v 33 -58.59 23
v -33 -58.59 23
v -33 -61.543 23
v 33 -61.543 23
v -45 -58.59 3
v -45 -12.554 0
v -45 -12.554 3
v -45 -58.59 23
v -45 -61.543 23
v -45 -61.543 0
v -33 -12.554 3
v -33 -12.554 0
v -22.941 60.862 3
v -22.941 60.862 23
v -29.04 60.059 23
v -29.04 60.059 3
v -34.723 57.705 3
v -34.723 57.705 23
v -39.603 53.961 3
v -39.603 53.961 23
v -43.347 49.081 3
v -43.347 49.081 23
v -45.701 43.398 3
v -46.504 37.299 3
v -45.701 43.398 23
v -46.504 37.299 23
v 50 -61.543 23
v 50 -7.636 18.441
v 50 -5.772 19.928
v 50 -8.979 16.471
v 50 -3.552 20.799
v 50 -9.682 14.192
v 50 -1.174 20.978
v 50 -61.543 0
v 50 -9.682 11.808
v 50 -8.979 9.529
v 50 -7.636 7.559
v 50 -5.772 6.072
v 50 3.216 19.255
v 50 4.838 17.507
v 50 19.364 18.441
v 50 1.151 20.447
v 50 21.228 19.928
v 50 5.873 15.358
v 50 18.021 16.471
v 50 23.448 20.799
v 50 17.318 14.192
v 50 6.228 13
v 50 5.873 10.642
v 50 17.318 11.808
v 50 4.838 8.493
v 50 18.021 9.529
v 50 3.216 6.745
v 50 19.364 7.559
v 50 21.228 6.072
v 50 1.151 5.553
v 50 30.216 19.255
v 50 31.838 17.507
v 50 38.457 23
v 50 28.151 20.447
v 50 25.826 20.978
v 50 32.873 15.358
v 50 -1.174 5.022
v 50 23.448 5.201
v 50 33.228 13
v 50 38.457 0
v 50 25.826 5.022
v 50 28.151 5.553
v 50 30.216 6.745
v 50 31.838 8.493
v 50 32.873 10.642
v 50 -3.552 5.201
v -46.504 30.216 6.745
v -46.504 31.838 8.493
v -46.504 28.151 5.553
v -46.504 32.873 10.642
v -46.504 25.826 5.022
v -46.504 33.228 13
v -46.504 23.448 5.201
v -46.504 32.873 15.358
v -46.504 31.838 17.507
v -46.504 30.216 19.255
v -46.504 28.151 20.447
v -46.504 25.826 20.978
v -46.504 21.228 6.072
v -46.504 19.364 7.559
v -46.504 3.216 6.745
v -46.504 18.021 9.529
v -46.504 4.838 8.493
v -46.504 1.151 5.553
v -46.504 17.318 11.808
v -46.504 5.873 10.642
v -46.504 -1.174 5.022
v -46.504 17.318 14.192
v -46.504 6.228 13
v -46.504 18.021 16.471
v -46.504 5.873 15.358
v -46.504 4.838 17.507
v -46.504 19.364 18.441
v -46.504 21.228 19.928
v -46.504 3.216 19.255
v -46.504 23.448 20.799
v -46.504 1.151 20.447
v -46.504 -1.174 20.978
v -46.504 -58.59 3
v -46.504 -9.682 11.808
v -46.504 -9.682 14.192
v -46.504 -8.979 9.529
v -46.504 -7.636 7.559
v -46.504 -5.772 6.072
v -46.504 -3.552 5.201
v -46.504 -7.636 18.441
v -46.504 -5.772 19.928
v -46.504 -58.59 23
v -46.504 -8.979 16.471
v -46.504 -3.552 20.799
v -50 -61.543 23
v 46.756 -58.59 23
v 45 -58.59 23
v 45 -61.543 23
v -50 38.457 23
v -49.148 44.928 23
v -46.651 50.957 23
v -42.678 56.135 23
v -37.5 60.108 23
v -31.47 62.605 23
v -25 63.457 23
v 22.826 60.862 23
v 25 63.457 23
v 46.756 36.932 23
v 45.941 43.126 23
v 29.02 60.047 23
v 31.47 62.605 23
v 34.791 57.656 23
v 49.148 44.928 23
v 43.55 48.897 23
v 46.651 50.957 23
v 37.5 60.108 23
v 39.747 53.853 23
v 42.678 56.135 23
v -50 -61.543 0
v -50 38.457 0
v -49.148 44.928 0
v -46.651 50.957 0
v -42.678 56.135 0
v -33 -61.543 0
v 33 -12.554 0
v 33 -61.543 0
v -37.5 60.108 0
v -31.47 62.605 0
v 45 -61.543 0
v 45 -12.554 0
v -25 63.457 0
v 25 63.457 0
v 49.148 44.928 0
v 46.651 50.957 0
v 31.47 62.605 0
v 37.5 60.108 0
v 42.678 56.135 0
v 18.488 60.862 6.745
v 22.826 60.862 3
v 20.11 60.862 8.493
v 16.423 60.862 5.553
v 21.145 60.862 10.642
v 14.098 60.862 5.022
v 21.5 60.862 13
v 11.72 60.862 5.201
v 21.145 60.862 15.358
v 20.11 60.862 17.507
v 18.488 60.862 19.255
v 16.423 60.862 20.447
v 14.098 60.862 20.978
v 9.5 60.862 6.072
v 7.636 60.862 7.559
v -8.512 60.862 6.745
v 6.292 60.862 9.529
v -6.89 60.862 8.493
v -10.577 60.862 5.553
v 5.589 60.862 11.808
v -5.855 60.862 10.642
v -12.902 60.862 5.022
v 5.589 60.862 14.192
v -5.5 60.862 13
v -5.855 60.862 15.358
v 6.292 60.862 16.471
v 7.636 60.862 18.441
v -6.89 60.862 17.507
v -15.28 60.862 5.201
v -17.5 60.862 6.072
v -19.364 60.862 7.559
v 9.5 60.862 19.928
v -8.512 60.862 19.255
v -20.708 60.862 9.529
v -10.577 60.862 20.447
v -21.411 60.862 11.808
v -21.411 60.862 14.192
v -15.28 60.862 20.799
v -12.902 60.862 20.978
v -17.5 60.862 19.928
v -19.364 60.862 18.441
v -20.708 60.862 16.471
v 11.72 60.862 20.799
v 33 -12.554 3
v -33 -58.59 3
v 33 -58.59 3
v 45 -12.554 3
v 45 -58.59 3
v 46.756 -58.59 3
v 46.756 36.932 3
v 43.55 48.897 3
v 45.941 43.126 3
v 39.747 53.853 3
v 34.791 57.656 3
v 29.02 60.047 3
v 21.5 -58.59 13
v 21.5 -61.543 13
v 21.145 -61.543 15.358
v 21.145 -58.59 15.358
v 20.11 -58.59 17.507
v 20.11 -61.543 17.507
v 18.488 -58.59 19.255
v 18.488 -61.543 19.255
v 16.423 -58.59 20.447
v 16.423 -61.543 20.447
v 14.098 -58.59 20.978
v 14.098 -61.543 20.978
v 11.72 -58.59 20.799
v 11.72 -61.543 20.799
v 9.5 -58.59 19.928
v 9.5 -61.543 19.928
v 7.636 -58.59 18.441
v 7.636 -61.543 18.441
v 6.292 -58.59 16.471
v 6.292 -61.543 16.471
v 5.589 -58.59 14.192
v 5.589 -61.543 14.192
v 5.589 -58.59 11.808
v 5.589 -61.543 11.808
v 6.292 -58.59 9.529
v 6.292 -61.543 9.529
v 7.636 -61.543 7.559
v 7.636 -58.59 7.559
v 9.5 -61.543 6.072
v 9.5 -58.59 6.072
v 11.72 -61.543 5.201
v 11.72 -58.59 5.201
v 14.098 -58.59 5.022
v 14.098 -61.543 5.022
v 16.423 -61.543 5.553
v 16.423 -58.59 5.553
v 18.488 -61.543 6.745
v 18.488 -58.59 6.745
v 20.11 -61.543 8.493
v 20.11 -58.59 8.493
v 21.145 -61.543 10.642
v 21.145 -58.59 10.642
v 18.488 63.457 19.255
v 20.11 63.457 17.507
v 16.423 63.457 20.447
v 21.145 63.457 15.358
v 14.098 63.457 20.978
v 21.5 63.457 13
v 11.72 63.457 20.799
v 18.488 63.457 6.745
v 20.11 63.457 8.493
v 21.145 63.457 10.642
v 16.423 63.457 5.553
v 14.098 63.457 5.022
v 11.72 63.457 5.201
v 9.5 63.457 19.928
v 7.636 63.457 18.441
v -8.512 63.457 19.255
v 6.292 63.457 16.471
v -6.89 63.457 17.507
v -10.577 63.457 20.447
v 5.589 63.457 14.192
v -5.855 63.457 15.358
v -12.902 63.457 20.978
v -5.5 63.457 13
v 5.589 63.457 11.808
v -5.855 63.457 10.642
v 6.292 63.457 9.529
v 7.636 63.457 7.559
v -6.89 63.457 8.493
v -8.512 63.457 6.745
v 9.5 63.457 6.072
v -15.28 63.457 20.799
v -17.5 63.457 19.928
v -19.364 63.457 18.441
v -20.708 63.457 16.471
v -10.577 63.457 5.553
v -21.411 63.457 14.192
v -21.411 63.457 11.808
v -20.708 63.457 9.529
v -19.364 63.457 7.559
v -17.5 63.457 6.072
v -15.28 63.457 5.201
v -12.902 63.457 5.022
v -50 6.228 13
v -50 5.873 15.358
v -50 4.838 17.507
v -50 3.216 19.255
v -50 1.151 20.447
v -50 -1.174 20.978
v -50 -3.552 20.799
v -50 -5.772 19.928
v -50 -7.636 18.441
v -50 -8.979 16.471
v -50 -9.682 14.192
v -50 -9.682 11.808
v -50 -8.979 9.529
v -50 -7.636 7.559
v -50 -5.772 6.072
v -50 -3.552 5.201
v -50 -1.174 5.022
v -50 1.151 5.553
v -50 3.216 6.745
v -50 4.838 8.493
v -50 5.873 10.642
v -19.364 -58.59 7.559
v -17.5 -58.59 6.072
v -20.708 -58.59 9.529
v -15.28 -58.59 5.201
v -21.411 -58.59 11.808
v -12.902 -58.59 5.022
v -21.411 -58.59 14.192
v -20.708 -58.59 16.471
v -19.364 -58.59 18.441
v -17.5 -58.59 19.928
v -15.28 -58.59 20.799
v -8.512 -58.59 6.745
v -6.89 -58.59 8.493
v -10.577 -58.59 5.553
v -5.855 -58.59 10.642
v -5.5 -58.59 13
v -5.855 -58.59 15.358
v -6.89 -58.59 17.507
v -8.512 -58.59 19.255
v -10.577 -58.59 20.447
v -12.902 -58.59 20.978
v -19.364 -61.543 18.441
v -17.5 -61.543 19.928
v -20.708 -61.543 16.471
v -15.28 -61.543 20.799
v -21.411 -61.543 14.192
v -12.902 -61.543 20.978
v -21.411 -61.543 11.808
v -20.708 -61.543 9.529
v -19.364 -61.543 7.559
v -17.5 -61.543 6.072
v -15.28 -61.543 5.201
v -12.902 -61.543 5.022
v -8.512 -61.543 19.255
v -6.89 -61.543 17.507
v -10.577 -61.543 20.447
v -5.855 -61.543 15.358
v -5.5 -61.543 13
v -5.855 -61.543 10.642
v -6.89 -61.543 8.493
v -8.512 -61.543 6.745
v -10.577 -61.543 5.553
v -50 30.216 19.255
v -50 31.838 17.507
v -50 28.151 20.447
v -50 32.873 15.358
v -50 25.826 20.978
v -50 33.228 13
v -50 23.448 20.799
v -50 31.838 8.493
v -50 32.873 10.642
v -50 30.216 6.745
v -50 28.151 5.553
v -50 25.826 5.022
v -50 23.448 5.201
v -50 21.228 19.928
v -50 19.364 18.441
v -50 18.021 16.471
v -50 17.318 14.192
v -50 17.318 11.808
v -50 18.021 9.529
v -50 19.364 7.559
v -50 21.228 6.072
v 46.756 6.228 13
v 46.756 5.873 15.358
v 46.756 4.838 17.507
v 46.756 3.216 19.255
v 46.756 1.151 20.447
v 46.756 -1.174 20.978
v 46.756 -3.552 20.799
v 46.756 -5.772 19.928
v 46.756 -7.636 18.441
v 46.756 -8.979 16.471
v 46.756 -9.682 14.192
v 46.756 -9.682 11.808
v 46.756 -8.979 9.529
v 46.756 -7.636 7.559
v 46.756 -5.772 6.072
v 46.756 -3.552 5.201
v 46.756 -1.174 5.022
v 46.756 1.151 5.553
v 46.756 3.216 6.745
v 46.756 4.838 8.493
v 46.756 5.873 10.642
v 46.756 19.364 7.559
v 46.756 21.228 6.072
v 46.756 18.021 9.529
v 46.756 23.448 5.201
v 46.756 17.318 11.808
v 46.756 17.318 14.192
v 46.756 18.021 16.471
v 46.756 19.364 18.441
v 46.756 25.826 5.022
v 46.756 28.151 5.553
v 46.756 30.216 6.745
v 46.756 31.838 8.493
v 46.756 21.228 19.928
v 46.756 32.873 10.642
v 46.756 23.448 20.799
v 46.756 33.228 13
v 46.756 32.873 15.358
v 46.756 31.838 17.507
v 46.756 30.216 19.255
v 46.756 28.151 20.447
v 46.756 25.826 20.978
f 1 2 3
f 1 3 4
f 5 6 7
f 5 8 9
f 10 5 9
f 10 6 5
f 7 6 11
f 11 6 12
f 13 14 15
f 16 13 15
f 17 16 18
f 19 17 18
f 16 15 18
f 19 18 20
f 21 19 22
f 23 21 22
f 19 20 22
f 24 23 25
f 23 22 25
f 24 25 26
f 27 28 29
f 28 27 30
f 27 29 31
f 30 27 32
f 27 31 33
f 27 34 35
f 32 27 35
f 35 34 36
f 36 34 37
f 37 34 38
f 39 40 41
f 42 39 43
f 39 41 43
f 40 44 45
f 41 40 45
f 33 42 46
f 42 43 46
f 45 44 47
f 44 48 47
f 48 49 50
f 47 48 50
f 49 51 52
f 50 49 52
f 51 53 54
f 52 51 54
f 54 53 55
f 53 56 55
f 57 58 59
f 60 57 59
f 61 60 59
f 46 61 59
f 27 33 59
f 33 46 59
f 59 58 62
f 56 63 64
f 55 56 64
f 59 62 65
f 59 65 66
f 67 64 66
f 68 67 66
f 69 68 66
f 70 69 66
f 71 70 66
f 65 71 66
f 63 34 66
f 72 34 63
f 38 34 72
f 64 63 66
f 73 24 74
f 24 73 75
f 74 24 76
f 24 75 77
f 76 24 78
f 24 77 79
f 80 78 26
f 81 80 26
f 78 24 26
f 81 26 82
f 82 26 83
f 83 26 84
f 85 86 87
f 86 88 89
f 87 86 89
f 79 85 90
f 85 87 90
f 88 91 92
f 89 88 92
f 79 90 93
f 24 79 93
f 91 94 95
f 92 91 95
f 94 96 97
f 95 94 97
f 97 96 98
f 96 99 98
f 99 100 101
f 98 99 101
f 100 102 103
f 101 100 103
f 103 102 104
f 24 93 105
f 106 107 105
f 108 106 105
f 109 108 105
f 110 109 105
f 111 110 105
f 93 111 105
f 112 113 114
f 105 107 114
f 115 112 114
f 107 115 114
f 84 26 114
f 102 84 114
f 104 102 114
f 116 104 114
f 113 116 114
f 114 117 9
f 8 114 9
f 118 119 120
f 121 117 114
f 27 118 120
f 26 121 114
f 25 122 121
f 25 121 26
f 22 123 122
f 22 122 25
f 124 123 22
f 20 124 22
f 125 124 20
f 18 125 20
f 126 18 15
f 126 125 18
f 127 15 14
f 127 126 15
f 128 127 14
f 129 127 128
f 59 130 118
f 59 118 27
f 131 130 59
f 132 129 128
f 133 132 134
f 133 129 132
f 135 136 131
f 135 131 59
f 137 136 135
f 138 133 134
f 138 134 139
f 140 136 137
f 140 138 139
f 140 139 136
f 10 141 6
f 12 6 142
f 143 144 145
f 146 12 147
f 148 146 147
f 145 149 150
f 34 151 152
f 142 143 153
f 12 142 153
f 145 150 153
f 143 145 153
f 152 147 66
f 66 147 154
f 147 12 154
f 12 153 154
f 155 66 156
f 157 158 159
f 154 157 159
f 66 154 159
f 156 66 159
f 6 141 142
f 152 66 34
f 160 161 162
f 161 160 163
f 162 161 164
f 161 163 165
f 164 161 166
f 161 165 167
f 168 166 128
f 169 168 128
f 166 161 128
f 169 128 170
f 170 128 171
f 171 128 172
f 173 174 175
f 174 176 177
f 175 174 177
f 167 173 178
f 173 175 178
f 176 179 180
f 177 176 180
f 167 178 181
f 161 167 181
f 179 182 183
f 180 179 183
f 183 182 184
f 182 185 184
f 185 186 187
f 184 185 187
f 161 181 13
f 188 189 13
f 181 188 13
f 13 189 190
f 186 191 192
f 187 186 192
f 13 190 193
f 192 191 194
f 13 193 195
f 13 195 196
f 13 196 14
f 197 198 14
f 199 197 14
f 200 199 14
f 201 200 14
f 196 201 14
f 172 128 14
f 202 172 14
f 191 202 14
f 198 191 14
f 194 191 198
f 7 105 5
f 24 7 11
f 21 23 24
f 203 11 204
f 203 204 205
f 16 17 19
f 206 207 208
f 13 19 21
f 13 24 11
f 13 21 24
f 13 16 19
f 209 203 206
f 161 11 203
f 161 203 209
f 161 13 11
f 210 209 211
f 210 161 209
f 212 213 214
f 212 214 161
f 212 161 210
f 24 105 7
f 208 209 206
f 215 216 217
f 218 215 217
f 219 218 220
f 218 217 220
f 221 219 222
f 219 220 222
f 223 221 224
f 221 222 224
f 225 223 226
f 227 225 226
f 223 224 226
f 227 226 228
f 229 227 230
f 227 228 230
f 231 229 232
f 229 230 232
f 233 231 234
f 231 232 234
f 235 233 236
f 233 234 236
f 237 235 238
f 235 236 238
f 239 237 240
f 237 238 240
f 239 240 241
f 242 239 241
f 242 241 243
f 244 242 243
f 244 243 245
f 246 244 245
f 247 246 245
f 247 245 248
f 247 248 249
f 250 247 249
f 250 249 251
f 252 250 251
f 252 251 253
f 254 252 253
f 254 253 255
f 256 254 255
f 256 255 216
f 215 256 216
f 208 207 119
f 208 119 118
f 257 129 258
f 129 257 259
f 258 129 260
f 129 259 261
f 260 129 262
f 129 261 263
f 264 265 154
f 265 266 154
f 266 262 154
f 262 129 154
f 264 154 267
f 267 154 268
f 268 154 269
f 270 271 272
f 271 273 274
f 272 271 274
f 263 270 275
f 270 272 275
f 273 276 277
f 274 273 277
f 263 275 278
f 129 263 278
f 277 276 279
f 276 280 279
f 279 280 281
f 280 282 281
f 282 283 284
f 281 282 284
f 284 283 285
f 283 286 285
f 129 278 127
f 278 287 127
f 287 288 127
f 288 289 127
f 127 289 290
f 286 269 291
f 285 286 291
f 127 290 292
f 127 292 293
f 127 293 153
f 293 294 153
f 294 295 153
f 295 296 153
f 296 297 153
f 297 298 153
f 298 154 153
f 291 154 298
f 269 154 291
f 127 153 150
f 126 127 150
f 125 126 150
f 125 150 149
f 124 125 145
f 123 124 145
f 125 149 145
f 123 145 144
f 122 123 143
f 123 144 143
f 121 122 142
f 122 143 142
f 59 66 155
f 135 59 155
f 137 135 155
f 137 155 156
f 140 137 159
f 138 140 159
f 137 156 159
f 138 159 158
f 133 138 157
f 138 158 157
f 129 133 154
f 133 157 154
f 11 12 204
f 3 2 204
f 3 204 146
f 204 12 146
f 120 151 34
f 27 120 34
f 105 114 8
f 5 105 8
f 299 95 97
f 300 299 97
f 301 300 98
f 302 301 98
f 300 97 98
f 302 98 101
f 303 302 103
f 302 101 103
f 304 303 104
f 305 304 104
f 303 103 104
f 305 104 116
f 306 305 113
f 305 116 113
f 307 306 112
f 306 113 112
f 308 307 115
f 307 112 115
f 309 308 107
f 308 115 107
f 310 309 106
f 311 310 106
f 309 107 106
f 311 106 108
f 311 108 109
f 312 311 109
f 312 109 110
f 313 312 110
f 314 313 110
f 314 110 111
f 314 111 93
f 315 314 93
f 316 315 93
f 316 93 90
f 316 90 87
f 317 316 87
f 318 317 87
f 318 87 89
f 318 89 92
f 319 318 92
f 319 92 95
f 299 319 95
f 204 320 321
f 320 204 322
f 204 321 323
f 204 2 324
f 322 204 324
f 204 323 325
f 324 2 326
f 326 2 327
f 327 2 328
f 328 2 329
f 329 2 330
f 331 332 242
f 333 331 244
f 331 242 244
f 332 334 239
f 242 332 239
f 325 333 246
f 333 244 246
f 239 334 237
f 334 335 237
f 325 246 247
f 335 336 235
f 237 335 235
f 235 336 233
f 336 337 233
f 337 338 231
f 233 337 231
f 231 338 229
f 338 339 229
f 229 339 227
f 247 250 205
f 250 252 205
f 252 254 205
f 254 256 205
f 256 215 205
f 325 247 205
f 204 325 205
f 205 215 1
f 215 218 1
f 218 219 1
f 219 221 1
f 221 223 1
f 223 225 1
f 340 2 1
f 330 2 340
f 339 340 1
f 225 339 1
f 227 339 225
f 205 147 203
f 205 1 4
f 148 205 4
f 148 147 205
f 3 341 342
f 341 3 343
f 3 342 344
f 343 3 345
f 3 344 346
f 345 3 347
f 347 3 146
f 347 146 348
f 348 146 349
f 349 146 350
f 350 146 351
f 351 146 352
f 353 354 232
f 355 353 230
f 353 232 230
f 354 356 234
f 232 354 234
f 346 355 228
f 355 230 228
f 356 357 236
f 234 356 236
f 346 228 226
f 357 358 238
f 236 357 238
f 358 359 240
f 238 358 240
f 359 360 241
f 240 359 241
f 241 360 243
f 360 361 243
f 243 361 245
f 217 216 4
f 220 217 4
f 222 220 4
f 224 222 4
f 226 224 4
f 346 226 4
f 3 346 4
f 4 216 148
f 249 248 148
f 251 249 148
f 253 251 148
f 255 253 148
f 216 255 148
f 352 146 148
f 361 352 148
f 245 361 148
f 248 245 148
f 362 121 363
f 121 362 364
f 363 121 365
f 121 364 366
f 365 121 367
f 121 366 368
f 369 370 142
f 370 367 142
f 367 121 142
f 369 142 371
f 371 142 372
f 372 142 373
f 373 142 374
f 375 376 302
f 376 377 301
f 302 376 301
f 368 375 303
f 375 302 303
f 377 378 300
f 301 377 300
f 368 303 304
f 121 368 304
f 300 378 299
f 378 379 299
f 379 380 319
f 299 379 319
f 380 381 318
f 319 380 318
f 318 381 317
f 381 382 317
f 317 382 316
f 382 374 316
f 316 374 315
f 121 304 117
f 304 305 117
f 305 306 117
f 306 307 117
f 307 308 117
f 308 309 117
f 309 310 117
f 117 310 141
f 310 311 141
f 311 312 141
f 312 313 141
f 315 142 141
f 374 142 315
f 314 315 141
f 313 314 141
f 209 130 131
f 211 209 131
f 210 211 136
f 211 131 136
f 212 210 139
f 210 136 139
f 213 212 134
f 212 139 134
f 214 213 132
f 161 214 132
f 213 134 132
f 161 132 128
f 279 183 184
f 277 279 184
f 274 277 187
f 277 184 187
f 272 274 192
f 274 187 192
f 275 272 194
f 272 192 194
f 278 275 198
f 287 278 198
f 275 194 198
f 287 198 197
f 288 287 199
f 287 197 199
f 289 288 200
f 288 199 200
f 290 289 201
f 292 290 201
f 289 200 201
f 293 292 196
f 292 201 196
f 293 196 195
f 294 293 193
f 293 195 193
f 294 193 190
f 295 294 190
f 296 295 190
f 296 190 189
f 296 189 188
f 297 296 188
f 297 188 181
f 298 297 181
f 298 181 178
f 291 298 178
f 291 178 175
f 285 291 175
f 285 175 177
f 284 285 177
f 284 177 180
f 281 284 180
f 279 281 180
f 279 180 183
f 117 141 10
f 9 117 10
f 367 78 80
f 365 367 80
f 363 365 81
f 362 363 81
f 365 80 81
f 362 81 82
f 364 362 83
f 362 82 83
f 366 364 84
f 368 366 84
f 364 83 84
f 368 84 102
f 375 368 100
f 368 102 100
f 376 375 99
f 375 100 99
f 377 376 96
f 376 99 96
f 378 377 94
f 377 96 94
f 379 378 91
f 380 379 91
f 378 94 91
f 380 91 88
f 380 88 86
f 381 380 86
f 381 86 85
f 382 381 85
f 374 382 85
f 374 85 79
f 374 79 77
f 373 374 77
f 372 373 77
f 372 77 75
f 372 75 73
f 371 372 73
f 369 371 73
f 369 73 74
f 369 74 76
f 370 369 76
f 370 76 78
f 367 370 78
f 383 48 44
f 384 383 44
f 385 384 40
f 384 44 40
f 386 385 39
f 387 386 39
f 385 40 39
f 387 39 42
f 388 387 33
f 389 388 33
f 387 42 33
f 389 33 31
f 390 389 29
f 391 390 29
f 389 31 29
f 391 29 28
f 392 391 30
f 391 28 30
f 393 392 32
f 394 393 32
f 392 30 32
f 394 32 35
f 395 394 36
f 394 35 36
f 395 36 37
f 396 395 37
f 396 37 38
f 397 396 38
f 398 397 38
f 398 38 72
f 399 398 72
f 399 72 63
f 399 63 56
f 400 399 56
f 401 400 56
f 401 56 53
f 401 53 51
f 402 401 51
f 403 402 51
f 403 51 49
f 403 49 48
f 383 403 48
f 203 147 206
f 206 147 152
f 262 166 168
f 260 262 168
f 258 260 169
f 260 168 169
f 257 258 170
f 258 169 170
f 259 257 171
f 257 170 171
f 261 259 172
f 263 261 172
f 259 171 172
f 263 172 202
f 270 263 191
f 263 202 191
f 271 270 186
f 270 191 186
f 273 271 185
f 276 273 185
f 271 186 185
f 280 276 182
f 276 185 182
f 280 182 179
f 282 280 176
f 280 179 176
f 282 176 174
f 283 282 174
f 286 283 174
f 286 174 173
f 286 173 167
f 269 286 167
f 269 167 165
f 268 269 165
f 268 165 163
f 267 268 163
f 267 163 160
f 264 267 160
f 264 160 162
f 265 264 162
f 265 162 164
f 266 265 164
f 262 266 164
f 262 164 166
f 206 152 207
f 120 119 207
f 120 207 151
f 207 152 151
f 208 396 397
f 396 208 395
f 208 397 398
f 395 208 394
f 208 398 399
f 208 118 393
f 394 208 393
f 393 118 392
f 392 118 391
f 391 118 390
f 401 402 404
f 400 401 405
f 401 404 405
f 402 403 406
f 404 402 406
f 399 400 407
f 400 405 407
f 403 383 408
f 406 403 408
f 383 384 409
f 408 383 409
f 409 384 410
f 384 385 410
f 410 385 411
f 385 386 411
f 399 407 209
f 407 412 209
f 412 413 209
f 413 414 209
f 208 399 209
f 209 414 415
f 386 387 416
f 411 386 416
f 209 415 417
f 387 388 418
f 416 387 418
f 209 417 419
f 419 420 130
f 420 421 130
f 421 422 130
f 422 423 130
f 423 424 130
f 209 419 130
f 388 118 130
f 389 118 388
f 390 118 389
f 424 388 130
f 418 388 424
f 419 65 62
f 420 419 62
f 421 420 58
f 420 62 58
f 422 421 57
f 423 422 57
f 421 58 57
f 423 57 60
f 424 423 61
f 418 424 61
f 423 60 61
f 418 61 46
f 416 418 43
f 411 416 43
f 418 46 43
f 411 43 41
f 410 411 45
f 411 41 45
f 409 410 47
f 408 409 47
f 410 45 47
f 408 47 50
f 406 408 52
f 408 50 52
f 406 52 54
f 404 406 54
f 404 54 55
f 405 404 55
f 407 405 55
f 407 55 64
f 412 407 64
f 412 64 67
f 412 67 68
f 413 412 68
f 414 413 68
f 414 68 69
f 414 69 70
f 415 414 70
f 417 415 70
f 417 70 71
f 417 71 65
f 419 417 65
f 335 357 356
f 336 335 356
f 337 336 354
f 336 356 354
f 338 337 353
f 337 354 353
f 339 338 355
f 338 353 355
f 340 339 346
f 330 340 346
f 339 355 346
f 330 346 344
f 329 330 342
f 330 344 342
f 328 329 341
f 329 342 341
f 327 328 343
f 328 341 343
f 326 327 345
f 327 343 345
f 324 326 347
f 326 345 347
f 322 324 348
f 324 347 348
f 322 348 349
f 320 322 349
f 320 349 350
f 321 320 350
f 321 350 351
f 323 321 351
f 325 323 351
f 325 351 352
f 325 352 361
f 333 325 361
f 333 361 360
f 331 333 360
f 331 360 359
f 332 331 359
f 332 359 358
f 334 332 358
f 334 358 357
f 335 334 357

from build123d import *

# Parameters (mm, degrees)
PAD_DEPTH       = 23
POCKET_DEPTH    = 20
SKETCH002_R     = 8
POCKET001_DEPTH = 100.001
SKETCH003_R     = 8
POCKET002_DEPTH = 125.001
SKETCH004_W     = 12
SKETCH004_H     = 50
POCKET003_DEPTH = 23.001


with BuildPart() as part:
    # Sketch → Pad (new body)
    with BuildSketch(Plane.XY):
        with BuildLine():
            Line((-50, 38.45712), (-50, -61.54288))
            Line((-50, -61.54288), (50, -61.54288))
            Line((50, -61.54288), (50, 38.45712))
            ThreePointArc((50, 38.45712), (42.67767, 56.13479), (25, 63.45712))
            Line((25, 63.45712), (-25, 63.45712))
            ThreePointArc((-25, 63.45712), (-42.67767, 56.13479), (-50, 38.45712))
        make_face()
    extrude(amount=PAD_DEPTH)

    # Sketch001 → Pocket (cut)
    with BuildSketch(Plane.XY.offset(23)):
        with BuildLine():
            Line((-46.504223, 37.299377), (-46.504223, -58.589802))
            Line((-46.504223, -58.589802), (46.756358, -58.589802))
            Line((46.756358, -58.589802), (46.756358, 36.931984))
            ThreePointArc((46.756358, 36.931984), (39.747359, 53.853203), (22.82614, 60.862202))
            Line((22.82614, 60.862202), (-22.941398, 60.862202))
            ThreePointArc((-22.941398, 60.862202), (-39.602831, 53.96081), (-46.504223, 37.299377))
        make_face()
    extrude(amount=-POCKET_DEPTH, mode=Mode.SUBTRACT)

    # Sketch002 → Pocket001 (cut, through all)
    with BuildSketch(Plane.YZ.offset(50)):
        with Locations((-1.771652, 13)):
            Circle(SKETCH002_R)
        with Locations((25.228348, 13)):
            Circle(SKETCH002_R)
    extrude(amount=-POCKET001_DEPTH, mode=Mode.SUBTRACT)

    # Sketch003 → Pocket002 (cut, through all)
    with BuildSketch(Plane.XZ.offset(61.54288)):
        with Locations((-13.5, 13)):
            Circle(SKETCH003_R)
        with Locations((13.5, 13)):
            Circle(SKETCH003_R)
    extrude(amount=-POCKET002_DEPTH, mode=Mode.SUBTRACT)

    # Sketch004 → Pocket003 (cut, through all)
    with BuildSketch(Plane(origin=(0, 0, 0), x_dir=(1, 0, 0), z_dir=(0, 0, -1))):
        with Locations((-39, 37.553897)):
            Rectangle(SKETCH004_W, SKETCH004_H)
        with Locations((39, 37.553897)):
            Rectangle(SKETCH004_W, SKETCH004_H)
    extrude(amount=-POCKET003_DEPTH, mode=Mode.SUBTRACT)


solid = part.part
